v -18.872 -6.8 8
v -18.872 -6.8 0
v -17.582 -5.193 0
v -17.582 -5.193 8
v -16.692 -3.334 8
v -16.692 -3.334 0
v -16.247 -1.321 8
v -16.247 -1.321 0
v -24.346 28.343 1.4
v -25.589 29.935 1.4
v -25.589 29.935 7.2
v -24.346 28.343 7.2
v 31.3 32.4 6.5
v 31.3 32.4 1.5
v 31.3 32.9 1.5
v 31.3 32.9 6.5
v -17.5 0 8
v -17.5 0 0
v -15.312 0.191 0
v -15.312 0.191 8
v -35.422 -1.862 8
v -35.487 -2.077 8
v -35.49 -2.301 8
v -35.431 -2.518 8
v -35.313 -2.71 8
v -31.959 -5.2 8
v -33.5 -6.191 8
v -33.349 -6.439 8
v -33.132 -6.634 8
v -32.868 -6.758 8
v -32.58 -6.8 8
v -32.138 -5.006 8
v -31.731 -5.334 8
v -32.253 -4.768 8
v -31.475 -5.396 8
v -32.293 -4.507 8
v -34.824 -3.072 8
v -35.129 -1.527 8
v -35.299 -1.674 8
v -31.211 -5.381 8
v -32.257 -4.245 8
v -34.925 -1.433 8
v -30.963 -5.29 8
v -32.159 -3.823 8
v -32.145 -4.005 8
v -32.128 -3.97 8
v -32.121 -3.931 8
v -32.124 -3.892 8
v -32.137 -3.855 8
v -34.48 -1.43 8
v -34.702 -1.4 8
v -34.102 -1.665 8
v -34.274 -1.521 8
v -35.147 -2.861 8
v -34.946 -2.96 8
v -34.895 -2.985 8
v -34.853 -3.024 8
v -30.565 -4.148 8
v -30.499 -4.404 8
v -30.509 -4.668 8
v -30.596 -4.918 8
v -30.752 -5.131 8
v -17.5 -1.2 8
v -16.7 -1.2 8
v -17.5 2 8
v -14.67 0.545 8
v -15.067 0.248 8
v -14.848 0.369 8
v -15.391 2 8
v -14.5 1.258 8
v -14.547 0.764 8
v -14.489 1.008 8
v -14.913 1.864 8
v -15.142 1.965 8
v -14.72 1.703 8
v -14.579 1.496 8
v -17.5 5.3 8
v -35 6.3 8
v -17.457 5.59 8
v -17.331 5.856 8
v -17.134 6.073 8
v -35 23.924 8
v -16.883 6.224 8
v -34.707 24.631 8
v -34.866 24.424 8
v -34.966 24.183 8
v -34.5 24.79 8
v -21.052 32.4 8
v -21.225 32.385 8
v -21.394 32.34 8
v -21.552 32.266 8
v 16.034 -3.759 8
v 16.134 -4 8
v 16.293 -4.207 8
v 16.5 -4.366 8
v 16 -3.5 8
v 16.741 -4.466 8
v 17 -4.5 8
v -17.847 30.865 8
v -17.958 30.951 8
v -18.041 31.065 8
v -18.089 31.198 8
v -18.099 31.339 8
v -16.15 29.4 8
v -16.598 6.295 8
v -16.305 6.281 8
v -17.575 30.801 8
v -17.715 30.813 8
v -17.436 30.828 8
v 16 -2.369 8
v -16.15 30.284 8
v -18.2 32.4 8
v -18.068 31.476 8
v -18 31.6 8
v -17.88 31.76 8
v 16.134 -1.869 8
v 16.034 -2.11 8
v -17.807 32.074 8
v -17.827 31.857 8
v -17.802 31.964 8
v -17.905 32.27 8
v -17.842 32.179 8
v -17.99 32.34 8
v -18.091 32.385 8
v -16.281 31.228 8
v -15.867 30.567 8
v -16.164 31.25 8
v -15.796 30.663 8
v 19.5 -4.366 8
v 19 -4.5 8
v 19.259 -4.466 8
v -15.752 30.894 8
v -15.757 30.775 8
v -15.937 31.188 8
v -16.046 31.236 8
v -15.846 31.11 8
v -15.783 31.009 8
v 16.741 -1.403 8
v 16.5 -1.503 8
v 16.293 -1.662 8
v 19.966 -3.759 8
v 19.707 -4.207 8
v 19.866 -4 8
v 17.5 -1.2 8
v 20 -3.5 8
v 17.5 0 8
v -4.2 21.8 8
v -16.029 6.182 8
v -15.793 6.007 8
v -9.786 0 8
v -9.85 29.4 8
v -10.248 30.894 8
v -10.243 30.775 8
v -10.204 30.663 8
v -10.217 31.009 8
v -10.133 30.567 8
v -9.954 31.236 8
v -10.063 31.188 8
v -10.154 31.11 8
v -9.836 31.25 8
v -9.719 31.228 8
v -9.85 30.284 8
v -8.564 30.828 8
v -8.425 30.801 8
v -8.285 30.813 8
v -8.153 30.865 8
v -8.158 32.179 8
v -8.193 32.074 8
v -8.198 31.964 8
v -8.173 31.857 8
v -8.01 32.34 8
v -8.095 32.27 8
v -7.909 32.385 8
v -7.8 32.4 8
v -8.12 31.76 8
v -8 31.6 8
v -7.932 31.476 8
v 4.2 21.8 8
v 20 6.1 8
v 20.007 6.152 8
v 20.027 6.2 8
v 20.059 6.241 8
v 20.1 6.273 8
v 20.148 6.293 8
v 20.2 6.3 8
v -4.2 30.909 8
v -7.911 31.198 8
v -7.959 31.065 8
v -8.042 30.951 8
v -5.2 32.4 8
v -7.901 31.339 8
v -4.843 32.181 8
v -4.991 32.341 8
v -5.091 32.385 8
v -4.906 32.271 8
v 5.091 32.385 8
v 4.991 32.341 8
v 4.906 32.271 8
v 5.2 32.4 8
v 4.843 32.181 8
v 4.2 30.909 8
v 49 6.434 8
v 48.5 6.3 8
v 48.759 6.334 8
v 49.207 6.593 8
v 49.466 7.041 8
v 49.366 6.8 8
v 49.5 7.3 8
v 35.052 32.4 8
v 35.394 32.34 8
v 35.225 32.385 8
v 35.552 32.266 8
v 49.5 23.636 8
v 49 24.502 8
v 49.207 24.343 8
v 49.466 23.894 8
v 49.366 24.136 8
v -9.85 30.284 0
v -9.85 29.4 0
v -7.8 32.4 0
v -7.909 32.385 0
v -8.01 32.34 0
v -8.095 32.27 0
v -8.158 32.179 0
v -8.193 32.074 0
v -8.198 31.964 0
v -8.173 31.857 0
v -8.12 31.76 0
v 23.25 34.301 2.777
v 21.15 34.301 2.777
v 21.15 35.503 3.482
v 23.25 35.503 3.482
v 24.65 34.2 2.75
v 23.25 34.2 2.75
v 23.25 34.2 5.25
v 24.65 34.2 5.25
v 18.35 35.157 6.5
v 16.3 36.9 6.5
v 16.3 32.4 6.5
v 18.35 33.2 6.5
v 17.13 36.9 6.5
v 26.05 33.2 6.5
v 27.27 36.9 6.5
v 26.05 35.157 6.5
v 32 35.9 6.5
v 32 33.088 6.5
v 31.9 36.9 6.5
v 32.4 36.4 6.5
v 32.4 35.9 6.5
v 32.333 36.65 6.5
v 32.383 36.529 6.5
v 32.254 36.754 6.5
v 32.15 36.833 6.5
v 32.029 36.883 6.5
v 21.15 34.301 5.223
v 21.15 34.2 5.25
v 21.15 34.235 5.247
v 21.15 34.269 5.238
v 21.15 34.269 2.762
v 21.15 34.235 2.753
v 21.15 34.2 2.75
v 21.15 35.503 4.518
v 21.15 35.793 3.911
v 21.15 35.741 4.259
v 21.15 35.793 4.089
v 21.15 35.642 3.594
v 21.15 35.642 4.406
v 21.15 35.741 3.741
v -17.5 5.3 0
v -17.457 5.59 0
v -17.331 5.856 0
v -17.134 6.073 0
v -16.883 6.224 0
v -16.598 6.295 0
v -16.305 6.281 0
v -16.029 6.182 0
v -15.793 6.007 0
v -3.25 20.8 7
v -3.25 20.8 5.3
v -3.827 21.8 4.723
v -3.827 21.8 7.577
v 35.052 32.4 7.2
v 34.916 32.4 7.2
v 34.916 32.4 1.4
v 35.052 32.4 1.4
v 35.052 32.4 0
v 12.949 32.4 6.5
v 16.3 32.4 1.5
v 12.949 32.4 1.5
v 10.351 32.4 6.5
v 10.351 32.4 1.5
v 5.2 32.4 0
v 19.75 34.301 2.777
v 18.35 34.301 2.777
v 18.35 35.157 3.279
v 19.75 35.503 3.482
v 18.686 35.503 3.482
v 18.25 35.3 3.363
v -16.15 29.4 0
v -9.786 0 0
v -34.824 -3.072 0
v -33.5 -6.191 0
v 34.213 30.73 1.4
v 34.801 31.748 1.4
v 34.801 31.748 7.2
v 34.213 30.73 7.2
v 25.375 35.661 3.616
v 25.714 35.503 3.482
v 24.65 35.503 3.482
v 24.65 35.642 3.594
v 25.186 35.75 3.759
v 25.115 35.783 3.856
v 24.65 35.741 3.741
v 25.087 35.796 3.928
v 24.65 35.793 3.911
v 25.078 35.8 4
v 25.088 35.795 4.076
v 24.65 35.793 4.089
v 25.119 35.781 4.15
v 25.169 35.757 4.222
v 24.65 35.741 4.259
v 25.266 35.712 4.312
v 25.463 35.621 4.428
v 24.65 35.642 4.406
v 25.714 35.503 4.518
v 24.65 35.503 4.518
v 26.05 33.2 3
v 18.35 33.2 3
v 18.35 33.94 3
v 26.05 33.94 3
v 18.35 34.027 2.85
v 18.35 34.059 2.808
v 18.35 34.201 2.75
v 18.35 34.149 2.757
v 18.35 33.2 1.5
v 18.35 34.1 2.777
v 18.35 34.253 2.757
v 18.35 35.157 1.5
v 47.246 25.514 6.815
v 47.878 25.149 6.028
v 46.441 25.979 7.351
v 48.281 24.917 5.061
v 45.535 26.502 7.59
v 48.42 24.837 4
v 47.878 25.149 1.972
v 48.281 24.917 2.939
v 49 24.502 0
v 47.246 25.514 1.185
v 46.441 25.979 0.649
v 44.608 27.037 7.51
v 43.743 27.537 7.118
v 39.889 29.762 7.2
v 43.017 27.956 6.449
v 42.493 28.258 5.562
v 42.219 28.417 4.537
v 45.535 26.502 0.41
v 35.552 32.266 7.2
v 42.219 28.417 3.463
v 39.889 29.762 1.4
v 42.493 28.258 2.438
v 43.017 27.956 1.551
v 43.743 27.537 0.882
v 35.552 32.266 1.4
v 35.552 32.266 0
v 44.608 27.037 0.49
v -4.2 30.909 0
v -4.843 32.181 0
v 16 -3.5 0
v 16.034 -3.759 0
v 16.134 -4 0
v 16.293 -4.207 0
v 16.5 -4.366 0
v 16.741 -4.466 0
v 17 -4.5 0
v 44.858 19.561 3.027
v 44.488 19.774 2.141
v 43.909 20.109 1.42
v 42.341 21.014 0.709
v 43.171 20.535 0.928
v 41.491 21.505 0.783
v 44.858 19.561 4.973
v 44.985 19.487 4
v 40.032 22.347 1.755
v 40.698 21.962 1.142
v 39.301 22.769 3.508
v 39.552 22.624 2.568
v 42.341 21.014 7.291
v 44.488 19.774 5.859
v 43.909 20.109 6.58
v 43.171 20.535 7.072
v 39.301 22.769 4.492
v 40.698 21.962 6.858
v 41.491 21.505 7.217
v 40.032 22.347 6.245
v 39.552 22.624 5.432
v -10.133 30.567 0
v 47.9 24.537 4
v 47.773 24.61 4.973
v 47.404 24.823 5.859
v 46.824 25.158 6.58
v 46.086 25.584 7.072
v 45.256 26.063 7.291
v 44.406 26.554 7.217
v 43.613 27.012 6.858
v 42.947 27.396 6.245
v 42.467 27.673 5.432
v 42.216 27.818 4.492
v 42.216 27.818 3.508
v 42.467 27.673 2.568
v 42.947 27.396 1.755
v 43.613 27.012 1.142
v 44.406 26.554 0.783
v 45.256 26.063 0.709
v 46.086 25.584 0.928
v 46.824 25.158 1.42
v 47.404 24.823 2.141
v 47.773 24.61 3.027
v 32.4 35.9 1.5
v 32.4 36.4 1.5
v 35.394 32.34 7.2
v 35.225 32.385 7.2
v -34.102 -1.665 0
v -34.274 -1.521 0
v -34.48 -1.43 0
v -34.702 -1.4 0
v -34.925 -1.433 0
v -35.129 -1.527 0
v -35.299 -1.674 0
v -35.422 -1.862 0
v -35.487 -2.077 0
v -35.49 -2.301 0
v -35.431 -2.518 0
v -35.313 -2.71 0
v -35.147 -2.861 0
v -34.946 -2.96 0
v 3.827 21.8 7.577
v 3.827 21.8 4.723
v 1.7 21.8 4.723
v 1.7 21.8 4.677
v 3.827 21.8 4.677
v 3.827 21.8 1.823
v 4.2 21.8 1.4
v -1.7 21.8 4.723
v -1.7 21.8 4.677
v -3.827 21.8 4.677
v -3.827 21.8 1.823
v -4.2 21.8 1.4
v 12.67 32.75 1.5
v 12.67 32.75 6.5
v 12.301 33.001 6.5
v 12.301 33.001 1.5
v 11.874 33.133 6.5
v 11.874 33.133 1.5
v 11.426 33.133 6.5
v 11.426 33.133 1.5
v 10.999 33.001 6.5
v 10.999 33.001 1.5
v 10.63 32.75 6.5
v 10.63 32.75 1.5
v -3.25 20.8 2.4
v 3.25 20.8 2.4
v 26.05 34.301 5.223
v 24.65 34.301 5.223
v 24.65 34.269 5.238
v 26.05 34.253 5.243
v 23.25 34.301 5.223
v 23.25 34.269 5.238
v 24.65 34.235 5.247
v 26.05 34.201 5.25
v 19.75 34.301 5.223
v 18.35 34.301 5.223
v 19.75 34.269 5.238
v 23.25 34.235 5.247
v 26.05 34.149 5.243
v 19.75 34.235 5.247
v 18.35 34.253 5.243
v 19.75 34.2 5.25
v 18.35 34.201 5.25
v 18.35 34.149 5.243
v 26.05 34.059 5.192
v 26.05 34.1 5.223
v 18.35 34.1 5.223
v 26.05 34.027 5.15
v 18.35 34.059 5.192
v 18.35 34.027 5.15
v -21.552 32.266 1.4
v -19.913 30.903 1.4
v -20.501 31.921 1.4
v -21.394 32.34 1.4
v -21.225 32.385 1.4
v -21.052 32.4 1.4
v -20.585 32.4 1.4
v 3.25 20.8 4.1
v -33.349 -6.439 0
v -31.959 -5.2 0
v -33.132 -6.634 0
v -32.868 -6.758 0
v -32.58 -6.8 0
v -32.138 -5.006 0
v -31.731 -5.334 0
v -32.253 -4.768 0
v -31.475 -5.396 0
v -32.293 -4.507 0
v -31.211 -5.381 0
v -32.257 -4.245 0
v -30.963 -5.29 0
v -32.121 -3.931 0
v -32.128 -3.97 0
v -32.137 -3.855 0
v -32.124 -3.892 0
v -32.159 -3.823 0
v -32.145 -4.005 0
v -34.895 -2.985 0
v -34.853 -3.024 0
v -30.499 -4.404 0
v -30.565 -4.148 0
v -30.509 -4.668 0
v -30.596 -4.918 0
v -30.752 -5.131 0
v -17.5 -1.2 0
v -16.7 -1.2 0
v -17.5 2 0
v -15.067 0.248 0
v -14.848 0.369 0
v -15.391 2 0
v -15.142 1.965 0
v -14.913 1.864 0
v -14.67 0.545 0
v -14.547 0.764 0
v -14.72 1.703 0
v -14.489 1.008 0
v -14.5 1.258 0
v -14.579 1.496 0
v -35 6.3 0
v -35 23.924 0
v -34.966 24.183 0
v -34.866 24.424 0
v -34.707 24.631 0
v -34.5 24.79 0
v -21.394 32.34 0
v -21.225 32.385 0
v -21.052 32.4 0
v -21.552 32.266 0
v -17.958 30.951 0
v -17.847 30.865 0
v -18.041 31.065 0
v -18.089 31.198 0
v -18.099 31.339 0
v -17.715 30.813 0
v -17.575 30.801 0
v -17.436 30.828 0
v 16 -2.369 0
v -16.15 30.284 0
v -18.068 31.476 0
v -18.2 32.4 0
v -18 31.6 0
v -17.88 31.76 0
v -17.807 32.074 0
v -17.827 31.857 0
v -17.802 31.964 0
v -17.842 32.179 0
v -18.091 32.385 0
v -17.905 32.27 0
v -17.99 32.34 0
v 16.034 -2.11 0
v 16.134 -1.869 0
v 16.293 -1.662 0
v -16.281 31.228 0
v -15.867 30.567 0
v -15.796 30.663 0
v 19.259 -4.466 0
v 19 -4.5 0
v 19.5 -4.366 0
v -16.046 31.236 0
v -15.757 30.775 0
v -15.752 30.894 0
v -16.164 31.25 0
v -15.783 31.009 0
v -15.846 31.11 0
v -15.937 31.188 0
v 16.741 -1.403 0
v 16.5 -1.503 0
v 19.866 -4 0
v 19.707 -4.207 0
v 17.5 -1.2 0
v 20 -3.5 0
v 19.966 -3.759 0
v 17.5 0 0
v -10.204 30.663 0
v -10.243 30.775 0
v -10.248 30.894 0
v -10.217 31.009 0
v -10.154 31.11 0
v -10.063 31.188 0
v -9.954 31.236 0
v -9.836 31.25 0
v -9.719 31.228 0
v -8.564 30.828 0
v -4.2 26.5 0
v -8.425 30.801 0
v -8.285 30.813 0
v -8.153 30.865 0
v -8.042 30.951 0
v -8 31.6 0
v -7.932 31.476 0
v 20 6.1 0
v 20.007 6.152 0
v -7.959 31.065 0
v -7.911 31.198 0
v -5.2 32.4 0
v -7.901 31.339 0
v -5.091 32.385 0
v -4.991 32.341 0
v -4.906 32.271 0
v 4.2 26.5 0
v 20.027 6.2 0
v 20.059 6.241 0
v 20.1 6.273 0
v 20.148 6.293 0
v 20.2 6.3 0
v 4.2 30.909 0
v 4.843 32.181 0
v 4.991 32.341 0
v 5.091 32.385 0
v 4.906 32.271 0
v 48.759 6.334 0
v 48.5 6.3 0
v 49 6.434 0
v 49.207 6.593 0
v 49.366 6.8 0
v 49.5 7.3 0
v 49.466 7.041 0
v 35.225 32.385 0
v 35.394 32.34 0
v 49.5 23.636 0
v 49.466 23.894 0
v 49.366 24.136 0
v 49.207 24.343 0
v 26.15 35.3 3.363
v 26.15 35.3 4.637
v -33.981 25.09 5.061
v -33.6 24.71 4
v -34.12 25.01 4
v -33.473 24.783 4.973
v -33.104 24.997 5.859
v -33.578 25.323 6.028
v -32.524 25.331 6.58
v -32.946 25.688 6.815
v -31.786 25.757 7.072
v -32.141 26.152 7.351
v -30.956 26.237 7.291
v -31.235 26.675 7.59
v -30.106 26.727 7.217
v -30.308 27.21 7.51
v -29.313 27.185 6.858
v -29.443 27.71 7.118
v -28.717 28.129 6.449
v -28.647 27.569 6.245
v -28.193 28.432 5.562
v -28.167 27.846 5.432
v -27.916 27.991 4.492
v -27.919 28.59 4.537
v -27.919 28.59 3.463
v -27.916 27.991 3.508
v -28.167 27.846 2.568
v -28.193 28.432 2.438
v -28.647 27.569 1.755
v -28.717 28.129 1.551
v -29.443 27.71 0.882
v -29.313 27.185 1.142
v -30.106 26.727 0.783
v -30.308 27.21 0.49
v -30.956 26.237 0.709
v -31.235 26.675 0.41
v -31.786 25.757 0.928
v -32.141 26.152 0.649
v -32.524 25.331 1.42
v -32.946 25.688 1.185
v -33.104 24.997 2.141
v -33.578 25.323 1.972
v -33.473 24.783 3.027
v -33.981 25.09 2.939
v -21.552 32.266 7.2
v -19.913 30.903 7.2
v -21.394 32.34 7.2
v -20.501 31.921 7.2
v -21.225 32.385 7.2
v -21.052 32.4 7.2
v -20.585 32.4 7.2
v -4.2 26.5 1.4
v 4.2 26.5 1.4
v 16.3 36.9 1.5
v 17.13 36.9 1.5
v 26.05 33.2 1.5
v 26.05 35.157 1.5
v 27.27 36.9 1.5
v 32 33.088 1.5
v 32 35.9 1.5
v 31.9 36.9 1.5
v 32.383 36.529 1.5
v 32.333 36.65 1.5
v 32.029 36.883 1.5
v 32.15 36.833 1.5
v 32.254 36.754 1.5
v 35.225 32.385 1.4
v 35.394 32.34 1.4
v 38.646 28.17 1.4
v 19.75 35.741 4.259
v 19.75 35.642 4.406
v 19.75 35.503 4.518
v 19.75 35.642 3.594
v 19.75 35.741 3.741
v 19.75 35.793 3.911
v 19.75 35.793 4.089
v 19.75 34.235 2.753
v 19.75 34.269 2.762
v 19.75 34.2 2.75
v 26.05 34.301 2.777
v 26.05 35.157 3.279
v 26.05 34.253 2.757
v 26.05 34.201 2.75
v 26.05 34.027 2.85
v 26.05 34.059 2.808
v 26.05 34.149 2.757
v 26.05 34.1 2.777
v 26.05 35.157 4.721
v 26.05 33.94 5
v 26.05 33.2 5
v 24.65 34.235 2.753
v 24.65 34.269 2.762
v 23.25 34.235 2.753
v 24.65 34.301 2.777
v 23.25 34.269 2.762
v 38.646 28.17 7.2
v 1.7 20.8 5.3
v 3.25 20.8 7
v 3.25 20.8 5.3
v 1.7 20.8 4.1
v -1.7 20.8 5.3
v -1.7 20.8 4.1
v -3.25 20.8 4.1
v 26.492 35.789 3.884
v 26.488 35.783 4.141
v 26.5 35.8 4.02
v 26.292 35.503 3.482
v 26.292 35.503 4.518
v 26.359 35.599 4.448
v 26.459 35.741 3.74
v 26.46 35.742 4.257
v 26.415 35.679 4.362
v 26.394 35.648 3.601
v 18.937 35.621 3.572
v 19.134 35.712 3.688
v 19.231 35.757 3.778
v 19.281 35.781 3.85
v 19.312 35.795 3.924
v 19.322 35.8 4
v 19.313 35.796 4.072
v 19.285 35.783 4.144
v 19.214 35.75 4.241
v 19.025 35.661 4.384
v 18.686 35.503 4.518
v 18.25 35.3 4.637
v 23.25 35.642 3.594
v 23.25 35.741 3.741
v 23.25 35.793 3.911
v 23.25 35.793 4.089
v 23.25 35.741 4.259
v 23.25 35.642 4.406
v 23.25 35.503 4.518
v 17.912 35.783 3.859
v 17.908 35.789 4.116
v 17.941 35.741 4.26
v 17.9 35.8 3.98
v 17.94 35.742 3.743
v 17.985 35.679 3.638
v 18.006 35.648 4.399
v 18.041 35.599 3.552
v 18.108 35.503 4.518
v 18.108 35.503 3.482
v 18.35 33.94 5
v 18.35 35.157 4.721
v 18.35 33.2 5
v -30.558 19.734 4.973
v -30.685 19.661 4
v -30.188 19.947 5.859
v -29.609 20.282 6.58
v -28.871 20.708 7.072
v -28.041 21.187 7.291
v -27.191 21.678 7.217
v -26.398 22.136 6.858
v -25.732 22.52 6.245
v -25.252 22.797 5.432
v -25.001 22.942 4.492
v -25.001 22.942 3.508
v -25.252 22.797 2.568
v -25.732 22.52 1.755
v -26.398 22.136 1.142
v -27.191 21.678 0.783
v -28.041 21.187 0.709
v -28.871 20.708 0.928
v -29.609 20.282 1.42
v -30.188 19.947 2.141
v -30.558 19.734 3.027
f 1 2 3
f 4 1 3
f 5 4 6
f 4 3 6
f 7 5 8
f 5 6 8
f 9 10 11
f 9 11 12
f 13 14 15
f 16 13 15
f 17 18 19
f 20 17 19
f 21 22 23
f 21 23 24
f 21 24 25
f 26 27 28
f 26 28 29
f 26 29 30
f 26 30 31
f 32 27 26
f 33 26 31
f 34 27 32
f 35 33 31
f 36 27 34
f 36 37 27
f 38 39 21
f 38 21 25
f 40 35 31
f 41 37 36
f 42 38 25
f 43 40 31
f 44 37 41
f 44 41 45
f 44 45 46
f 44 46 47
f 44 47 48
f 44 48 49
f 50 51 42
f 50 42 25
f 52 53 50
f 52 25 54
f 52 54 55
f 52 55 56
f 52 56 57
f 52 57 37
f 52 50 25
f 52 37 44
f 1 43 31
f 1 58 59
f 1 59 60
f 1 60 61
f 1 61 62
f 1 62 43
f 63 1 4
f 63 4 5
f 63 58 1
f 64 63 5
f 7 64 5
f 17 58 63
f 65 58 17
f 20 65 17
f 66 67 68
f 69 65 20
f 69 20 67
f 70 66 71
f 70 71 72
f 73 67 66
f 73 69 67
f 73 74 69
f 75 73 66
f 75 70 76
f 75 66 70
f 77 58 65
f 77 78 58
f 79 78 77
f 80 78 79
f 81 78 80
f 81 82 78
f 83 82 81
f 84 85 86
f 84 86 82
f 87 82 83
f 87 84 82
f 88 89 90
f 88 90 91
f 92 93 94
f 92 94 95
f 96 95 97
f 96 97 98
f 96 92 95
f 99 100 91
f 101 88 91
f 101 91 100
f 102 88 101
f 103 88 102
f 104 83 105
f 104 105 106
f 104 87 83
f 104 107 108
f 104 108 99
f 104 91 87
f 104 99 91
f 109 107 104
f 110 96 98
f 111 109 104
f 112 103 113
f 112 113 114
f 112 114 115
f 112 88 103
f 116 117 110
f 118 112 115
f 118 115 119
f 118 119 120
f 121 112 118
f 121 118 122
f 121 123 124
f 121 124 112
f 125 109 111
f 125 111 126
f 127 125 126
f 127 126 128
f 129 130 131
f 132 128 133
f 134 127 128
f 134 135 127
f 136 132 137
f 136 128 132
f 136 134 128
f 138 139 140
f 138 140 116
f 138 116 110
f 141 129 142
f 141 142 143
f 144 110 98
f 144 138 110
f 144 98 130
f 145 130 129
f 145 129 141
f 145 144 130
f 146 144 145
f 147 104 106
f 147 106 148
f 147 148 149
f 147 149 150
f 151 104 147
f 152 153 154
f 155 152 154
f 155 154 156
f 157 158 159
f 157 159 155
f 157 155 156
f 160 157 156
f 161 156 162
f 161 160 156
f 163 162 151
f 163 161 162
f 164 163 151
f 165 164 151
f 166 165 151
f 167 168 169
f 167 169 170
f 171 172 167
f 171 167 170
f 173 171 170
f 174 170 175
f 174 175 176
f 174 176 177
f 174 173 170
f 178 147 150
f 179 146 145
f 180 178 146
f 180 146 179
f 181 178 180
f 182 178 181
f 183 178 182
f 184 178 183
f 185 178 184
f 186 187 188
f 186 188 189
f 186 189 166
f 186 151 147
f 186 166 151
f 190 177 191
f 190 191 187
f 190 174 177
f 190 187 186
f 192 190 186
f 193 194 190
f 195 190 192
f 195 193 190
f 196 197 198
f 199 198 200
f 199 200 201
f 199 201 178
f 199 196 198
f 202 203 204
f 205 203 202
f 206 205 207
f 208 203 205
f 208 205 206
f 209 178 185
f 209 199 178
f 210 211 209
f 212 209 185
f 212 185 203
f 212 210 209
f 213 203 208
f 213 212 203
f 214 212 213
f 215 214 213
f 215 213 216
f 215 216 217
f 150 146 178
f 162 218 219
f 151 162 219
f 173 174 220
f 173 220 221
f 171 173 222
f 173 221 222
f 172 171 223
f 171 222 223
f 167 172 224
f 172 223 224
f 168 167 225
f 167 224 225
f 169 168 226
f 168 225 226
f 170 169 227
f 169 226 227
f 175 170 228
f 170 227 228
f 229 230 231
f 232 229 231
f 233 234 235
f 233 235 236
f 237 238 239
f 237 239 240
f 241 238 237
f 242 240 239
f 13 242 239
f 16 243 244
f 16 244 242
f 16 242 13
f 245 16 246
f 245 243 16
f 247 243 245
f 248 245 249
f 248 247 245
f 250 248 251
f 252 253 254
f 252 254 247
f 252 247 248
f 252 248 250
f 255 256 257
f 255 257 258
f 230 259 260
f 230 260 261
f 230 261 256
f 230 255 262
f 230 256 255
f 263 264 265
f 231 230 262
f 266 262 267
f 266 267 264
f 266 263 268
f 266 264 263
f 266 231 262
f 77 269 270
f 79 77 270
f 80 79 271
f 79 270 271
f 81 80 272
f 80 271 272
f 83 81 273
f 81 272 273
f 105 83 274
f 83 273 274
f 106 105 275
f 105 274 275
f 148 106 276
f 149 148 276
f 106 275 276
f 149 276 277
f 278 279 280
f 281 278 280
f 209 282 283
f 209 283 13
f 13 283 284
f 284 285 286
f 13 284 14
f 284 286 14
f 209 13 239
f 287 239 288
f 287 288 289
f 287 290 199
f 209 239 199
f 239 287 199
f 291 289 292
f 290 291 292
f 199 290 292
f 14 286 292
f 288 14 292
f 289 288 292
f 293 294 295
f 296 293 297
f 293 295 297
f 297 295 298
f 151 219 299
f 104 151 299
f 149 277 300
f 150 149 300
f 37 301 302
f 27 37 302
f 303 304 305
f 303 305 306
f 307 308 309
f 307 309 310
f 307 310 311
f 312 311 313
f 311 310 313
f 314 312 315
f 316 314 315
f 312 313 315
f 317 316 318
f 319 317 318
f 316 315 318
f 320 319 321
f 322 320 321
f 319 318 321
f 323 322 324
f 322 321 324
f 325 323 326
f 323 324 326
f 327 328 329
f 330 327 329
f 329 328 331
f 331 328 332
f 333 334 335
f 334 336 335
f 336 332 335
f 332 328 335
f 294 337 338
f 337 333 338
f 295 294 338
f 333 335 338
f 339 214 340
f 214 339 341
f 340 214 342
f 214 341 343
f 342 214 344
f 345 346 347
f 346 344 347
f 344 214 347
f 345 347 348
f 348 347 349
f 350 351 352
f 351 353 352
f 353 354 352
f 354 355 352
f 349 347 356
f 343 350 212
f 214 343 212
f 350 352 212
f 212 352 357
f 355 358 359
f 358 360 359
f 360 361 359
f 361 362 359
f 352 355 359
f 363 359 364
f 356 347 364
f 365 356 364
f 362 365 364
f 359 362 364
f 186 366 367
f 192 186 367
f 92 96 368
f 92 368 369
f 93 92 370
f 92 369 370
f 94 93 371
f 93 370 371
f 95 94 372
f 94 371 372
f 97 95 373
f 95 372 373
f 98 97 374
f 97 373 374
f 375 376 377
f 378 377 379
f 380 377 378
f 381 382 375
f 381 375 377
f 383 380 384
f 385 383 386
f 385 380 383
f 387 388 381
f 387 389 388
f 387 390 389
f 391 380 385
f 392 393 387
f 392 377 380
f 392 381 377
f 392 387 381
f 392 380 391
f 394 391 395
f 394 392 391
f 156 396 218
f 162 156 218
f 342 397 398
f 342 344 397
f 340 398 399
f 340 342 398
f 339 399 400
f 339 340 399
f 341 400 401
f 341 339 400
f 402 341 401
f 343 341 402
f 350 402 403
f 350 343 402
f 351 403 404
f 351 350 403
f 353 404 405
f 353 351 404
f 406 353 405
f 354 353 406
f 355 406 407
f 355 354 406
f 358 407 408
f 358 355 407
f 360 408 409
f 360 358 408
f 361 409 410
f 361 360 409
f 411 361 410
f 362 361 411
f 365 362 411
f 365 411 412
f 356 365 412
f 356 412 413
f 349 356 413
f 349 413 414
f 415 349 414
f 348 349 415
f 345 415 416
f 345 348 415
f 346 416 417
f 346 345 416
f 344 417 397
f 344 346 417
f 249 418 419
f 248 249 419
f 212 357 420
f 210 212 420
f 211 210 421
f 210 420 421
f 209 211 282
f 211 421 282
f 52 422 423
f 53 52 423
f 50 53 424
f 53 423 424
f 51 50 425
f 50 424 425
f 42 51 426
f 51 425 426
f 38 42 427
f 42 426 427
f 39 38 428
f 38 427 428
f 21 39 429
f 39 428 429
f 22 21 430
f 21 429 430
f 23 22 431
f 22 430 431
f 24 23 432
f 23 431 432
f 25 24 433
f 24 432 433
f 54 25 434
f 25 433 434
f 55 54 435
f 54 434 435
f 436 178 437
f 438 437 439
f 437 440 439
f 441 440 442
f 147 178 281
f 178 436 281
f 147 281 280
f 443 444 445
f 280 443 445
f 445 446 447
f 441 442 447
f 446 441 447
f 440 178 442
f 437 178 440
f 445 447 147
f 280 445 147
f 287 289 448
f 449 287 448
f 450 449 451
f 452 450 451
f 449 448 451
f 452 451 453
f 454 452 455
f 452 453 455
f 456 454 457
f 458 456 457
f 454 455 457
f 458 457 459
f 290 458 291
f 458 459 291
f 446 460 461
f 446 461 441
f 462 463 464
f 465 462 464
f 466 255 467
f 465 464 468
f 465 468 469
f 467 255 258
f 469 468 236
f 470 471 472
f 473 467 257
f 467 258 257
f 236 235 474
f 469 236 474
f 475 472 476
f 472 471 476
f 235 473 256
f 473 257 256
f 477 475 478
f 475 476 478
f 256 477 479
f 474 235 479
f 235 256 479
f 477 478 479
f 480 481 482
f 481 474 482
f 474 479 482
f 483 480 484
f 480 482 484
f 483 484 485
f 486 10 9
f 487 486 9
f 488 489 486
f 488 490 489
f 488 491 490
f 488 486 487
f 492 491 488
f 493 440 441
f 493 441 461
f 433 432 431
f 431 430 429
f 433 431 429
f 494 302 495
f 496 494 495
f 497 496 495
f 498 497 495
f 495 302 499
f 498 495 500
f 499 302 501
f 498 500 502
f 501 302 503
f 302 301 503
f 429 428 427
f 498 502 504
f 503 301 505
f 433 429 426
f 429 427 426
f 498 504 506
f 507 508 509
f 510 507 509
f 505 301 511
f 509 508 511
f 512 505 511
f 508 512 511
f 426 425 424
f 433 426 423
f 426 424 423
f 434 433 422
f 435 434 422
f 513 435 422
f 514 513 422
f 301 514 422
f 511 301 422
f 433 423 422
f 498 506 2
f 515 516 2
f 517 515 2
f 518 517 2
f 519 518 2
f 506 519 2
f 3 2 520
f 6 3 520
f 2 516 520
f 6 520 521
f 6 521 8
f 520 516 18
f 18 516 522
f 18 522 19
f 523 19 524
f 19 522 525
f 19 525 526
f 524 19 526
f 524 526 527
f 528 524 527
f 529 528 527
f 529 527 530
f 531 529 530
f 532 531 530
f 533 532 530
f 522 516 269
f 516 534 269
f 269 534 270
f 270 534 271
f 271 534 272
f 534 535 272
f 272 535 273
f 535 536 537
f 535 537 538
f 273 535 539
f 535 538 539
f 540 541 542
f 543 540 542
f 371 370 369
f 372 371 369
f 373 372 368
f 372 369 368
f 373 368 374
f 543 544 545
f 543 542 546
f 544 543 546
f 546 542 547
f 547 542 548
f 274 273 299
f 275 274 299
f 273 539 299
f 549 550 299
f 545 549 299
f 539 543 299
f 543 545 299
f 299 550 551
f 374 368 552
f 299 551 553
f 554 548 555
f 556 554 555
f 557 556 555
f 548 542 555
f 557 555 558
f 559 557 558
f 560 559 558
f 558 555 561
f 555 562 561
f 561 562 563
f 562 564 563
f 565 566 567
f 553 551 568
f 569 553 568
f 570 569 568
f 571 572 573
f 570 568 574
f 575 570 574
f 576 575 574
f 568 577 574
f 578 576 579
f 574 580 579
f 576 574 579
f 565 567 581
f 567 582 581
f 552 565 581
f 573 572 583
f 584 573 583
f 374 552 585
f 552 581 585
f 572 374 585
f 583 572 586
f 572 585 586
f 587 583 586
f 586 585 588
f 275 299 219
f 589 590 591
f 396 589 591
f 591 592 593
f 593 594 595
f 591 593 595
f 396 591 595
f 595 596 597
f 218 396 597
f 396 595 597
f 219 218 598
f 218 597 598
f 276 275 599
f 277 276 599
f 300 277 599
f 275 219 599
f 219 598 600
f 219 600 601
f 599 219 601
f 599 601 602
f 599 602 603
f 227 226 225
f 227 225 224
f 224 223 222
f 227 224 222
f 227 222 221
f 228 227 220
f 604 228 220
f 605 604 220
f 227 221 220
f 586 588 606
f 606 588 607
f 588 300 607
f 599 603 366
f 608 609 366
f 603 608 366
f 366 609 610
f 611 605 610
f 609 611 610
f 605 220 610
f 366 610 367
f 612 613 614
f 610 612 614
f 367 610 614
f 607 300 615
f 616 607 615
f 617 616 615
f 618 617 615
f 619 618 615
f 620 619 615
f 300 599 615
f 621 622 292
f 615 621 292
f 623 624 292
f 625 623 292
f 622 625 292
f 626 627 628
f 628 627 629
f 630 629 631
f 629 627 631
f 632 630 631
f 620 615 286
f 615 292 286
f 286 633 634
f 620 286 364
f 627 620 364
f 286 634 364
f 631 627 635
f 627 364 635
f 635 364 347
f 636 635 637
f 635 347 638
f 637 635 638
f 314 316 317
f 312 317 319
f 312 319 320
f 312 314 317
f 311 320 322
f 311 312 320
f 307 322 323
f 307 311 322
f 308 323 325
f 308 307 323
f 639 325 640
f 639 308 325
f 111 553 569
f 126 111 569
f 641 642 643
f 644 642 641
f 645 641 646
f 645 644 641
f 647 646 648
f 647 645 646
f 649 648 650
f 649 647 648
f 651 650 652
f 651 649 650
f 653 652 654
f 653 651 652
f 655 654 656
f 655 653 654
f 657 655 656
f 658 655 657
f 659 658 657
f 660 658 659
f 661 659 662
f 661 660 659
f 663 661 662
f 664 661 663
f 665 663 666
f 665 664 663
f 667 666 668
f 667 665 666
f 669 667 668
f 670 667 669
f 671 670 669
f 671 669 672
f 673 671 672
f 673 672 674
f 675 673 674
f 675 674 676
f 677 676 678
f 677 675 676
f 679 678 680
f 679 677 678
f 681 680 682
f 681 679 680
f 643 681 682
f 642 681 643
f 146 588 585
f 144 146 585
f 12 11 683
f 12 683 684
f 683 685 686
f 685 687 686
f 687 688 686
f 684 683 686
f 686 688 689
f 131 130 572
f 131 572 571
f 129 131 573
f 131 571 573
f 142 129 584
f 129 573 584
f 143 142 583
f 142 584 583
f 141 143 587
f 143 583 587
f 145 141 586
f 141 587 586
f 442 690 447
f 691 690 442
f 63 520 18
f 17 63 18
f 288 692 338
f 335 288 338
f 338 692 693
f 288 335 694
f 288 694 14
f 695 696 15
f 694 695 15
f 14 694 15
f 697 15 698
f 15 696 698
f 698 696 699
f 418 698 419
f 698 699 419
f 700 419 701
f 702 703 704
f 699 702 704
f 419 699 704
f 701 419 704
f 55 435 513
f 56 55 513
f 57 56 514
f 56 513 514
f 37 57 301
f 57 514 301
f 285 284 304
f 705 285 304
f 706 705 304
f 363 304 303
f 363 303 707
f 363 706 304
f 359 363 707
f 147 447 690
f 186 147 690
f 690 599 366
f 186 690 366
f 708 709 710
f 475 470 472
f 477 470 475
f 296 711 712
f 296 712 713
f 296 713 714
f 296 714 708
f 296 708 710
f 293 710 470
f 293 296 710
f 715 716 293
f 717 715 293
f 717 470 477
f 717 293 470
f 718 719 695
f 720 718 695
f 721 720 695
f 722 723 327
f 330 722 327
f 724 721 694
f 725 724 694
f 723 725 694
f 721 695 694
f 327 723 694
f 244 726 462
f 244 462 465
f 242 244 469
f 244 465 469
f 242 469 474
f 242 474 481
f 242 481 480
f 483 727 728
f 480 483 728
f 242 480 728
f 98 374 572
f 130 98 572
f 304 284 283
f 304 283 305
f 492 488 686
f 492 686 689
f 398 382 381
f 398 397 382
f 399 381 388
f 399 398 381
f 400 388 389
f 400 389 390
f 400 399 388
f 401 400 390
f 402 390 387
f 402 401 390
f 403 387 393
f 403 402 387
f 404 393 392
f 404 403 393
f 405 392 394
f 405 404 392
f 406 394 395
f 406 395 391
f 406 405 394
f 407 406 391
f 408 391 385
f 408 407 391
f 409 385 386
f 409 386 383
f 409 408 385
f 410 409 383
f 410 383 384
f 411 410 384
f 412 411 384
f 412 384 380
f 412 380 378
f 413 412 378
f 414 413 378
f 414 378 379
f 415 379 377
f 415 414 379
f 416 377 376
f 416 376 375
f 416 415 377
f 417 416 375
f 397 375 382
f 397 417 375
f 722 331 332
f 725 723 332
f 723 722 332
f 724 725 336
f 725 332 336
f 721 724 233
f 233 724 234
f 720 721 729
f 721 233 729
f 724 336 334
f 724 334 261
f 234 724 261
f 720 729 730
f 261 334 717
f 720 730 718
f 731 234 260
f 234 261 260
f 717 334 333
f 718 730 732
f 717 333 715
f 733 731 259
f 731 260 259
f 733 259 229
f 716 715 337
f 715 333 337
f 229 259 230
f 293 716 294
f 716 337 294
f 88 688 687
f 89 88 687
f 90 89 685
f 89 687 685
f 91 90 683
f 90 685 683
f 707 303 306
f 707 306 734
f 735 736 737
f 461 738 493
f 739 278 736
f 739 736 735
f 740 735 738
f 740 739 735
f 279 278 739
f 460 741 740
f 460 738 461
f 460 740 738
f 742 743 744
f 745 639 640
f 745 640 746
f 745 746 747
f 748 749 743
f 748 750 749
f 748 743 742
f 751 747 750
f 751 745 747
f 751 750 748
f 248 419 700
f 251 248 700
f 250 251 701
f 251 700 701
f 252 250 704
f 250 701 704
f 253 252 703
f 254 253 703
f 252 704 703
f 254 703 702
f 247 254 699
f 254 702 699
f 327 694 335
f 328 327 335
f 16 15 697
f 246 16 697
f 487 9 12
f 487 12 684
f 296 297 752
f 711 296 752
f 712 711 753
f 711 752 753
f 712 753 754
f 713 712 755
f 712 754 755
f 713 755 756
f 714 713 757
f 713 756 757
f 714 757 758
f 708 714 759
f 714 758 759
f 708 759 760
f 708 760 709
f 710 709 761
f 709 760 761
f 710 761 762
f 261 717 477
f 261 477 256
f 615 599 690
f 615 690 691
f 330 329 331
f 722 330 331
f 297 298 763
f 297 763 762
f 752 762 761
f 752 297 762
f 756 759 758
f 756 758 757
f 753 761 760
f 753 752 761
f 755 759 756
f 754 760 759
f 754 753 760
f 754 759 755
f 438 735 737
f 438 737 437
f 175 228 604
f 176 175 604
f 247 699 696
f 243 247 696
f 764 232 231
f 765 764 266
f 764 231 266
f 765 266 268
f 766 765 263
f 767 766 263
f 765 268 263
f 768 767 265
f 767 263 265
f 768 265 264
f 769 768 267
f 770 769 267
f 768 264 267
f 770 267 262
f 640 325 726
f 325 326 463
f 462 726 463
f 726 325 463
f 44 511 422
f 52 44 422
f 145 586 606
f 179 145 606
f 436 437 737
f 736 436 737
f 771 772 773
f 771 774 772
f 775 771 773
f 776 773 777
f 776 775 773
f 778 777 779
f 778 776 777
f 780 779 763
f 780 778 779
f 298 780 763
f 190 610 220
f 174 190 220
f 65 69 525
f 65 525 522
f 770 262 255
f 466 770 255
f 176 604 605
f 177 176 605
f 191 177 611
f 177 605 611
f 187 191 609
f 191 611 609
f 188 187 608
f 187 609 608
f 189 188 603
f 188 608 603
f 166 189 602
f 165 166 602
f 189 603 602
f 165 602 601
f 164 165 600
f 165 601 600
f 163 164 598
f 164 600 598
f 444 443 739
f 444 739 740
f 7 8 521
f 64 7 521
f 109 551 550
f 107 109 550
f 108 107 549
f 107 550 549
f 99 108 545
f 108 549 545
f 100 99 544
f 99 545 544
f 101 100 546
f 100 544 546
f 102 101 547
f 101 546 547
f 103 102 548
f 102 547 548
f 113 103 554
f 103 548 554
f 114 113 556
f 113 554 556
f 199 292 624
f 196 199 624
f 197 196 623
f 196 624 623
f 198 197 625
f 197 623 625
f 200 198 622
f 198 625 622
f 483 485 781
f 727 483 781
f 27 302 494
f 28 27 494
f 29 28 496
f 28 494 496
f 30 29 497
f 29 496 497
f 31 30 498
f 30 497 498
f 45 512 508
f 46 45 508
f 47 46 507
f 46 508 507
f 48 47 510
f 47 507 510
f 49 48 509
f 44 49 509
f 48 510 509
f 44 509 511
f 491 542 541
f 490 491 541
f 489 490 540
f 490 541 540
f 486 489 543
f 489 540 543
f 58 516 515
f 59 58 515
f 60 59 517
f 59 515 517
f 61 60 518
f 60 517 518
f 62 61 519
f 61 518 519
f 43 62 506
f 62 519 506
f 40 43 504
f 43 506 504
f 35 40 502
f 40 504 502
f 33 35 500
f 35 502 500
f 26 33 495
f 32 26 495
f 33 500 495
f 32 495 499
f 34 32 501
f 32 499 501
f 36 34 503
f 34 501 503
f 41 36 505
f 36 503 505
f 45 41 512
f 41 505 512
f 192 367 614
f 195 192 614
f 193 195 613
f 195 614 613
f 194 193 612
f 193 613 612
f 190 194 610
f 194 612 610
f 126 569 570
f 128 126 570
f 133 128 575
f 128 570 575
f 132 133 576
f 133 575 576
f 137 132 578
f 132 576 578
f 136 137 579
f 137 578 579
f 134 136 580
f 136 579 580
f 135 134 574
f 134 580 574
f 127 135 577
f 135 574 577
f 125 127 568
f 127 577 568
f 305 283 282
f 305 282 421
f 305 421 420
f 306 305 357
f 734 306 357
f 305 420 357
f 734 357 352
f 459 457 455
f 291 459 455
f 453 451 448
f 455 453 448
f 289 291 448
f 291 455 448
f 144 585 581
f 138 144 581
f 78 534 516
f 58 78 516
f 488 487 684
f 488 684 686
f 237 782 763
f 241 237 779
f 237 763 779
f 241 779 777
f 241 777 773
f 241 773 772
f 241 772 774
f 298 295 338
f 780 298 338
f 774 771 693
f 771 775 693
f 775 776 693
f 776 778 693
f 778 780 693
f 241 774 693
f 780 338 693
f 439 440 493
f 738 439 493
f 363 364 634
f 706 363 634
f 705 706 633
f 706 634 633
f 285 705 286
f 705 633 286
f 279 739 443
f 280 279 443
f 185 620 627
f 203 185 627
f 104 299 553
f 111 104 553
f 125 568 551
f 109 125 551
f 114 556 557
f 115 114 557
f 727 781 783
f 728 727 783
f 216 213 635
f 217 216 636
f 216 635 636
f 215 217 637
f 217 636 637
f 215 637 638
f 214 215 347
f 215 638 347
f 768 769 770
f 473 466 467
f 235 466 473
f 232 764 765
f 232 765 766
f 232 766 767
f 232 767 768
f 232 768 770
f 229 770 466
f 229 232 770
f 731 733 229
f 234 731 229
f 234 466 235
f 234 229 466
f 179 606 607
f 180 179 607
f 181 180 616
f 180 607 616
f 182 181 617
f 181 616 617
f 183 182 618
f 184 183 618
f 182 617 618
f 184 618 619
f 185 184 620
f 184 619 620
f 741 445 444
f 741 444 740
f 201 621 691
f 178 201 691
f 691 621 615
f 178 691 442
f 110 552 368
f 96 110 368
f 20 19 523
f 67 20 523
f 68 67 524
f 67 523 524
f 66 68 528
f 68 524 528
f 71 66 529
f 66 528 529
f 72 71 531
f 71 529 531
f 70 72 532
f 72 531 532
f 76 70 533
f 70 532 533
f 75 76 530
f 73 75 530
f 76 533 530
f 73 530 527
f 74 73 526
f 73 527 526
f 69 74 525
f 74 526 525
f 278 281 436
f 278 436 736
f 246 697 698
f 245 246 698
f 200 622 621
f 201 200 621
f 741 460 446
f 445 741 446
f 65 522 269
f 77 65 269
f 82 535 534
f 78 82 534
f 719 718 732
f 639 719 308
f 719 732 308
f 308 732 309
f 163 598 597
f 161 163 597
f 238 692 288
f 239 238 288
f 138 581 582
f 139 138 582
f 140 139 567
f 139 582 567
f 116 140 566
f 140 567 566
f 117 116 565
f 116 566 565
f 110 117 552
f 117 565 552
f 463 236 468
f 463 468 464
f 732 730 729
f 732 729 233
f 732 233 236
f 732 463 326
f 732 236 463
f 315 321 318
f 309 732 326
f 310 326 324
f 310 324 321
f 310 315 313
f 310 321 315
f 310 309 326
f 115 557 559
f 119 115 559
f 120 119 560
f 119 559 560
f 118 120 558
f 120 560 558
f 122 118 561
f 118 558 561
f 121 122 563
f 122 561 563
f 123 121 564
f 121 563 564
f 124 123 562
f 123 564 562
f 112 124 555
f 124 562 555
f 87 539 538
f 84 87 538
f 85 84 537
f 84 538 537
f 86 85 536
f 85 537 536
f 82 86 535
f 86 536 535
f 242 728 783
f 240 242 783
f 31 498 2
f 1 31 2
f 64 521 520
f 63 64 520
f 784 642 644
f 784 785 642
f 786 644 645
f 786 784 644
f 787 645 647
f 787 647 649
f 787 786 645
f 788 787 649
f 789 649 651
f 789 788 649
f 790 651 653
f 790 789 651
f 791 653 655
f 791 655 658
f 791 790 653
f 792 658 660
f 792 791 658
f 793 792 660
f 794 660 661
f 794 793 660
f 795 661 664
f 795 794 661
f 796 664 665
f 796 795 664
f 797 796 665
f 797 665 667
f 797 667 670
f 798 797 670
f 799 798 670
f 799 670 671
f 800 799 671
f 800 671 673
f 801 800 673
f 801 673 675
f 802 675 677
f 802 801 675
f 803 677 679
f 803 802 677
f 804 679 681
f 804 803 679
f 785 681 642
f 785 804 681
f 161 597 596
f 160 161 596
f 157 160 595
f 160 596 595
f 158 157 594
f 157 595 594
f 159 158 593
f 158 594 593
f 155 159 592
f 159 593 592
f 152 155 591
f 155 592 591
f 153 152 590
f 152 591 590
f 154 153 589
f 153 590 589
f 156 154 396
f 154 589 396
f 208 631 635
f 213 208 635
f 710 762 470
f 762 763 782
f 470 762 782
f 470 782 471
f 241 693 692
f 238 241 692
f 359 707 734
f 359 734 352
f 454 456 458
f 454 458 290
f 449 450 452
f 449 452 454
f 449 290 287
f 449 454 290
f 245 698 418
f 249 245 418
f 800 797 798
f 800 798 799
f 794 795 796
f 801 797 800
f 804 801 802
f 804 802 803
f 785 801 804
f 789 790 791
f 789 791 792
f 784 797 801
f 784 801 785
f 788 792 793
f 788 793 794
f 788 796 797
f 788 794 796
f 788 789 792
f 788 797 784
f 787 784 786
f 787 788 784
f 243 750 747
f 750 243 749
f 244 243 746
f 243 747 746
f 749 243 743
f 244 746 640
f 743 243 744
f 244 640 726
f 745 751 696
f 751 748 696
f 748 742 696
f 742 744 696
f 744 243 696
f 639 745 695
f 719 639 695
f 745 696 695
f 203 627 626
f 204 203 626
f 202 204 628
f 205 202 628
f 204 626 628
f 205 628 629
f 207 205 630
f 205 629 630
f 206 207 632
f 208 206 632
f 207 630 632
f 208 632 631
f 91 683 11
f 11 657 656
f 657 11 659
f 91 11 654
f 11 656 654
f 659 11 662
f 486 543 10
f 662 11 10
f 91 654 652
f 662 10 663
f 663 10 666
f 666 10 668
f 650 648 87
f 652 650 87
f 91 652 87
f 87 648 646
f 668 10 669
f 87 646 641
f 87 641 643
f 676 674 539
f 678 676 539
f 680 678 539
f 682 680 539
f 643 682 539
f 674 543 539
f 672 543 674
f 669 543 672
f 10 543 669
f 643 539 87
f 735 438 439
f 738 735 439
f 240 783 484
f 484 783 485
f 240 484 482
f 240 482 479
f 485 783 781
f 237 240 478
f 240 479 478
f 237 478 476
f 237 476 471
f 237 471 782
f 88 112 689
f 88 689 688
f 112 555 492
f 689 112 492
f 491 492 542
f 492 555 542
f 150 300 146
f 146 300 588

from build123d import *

# Parameters (mm, degrees)
EXTRUDE1_DEPTH       = 8
SKETCH2_W            = 8.4
SKETCH2_H            = 4.7
EXTRUDE2_DEPTH       = 1.4
EXTRUDE3_DEPTH       = 4.2
EXTRUDE3_DEPTH_BACK  = 4.2
EXTRUDE4_DEPTH       = 4.2
EXTRUDE4_DEPTH_BACK  = 4.2
EXTRUDE5_DEPTH       = 1.7
EXTRUDE5_DEPTH_BACK  = 1.7
SKETCH5_W            = 2
SKETCH5_H            = 1
EXTRUDE6_DEPTH       = 8
EXTRUDE7_DEPTH       = 8
EXTRUDE8_DEPTH       = 5.8
EXTRUDE9_DEPTH       = 5.8
EXTRUDE10_DEPTH      = 2.5
EXTRUDE10_DEPTH_BACK = 2.5
EXTRUDE11_DEPTH      = 5
EXTRUDE11_DEPTH_BACK = 5
EXTRUDE12_DEPTH      = 1.5
EXTRUDE12_DEPTH_BACK = 1.5


with BuildPart() as part:
    # Sketch1 → Extrude1 (new body)
    with BuildSketch(Plane.XY):
        with BuildLine():
            Line((-34.824054735, -3.072067398), (-33.500260521, -6.190731128))
            ThreePointArc((-33.500260521, -6.190731128), (-33.131692653, -6.633885822), (-32.579755667, -6.8))
            Line((-32.579755667, -6.8), (-18.872283192, -6.8))
            ThreePointArc((-18.872283192, -6.8), (-17.083537757, -4.288835387), (-16.247280004, -1.321305957))
            Line((-16.247280004, -1.321305957), (-16.7, -1.2))
            Line((-16.7, -1.2), (-17.5, -1.2))
            Line((-17.5, -1.2), (-17.5, 0))
            Line((-17.5, 0), (-15.311743878, 0.191447604))
            ThreePointArc((-15.311743878, 0.191447604), (-14.485569293, 1.133519165), (-15.390706981, 2))
            Line((-15.390706981, 2), (-17.5, 2))
            Line((-17.5, 2), (-17.5, 5.3))
            ThreePointArc((-17.5, 5.3), (-16.882683432, 6.223879533), (-15.792893219, 6.007106781))
            Line((-15.792893219, 6.007106781), (-9.785786438, 0))
            Line((-9.785786438, 0), (17.5, 0))
            Line((17.5, 0), (17.5, -1.2))
            Line((17.5, -1.2), (16.741180955, -1.40332495))
            ThreePointArc((16.741180955, -1.40332495), (16.20664666, -1.760489348), (16, -2.369250777))
            Line((16, -2.369250777), (16, -3.5))
            ThreePointArc((16, -3.5), (16.292893219, -4.207106781), (17, -4.5))
            Line((17, -4.5), (19, -4.5))
            ThreePointArc((19, -4.5), (19.707106781, -4.207106781), (20, -3.5))
            Line((20, -3.5), (20, 6.1))
            ThreePointArc((20, 6.1), (20.058578644, 6.241421356), (20.2, 6.3))
            Line((20.2, 6.3), (48.5, 6.3))
            ThreePointArc((48.5, 6.3), (49.207106781, 6.592893219), (49.5, 7.3))
            Line((49.5, 7.3), (49.5, 23.635680518))
            ThreePointArc((49.5, 23.635680518), (49.366025404, 24.135680518), (49, 24.501705922))
            Line((49, 24.501705922), (35.551804172, 32.266025404))
            ThreePointArc((35.551804172, 32.266025404), (35.310623217, 32.365925826), (35.051804172, 32.4))
            Line((35.051804172, 32.4), (5.2, 32.4))
            ThreePointArc((5.2, 32.4), (4.990511031, 32.340755589), (4.843077314, 32.180571859))
            Line((4.843077314, 32.180571859), (4.2, 30.909449746))
            Line((4.2, 30.909449746), (4.2, 21.8))
            Line((4.2, 21.8), (-4.2, 21.8))
            Line((-4.2, 21.8), (-4.2, 30.909449746))
            Line((-4.2, 30.909449746), (-4.843077314, 32.180571859))
            ThreePointArc((-4.843077314, 32.180571859), (-4.990511031, 32.340755589), (-5.2, 32.4))
            Line((-5.2, 32.4), (-7.8, 32.4))
            ThreePointArc((-7.8, 32.4), (-8.157770876, 32.178885438), (-8.12, 31.76))
            Line((-8.12, 31.76), (-8, 31.6))
            ThreePointArc((-8, 31.6), (-7.996119463, 31.005244998), (-8.563727578, 30.827566639))
            Line((-8.563727578, 30.827566639), (-9.719017938, 31.227946689))
            ThreePointArc((-9.719017938, 31.227946689), (-10.189007481, 31.062306212), (-10.132842712, 30.567157288))
            Line((-10.132842712, 30.567157288), (-9.85, 30.284314575))
            Line((-9.85, 30.284314575), (-9.85, 29.4))
            Line((-9.85, 29.4), (-13, 29.4))
            Line((-13, 29.4), (-16.15, 29.4))
            Line((-16.15, 29.4), (-16.15, 30.284314575))
            Line((-16.15, 30.284314575), (-15.867157288, 30.567157288))
            ThreePointArc((-15.867157288, 30.567157288), (-15.810992519, 31.062306212), (-16.280982062, 31.227946689))
            Line((-16.280982062, 31.227946689), (-17.436272422, 30.827566639))
            ThreePointArc((-17.436272422, 30.827566639), (-18.003880537, 31.005244998), (-18, 31.6))
            Line((-18, 31.6), (-17.88, 31.76))
            ThreePointArc((-17.88, 31.76), (-17.842229124, 32.178885438), (-18.2, 32.4))
            Line((-18.2, 32.4), (-21.051804172, 32.4))
            ThreePointArc((-21.051804172, 32.4), (-21.310623217, 32.365925826), (-21.551804172, 32.266025404))
            Line((-21.551804172, 32.266025404), (-34.5, 24.790381057))
            ThreePointArc((-34.5, 24.790381057), (-34.866025404, 24.424355653), (-35, 23.924355653))
            Line((-35, 23.924355653), (-35, 6.3))
            Line((-35, 6.3), (-30.564941956, -4.148341984))
            ThreePointArc((-30.564941956, -4.148341984), (-31.474501075, -5.396338117), (-32.145272576, -4.005346482))
            ThreePointArc((-32.145272576, -4.005346482), (-32.121013363, -3.911579893), (-32.15911356, -3.822534638))
            Line((-32.15911356, -3.822534638), (-34.102040633, -1.664695515))
            ThreePointArc((-34.102040633, -1.664695515), (-35.366900567, -1.76337794), (-34.945835863, -2.960170899))
            ThreePointArc((-34.945835863, -2.960170899), (-34.872837521, -3.002941804), (-34.824054735, -3.072067398))
        make_face()
    extrude(amount=EXTRUDE1_DEPTH)

    # Sketch2 → Extrude2 (add)
    with BuildSketch(Plane.XY):
        with Locations((0, 24.15)):
            Rectangle(SKETCH2_W, SKETCH2_H)
    extrude(amount=EXTRUDE2_DEPTH)

    # Sketch3 → Extrude3 (cut, two sides: drawn at the far end of the back side and taken through both)
    with BuildSketch(Plane(origin=(0, 0, 0), x_dir=(0, 0, -1), z_dir=(1, 0, 0)).offset(-EXTRUDE3_DEPTH_BACK)):
        Polygon((-7.577350269, 21.8), (-7, 20.8), (-5.3, 20.8), (-4.722649731, 21.8), align=None)
    extrude(amount=EXTRUDE3_DEPTH + EXTRUDE3_DEPTH_BACK, mode=Mode.SUBTRACT)

    # Sketch4 → Extrude4 (cut, two sides: drawn at the far end of the back side and taken through both)
    with BuildSketch(Plane(origin=(0, 0, 0), x_dir=(0, 0, -1), z_dir=(1, 0, 0)).offset(-EXTRUDE4_DEPTH_BACK)):
        Polygon((-4.677350269, 21.8), (-4.1, 20.8), (-2.4, 20.8), (-1.822649731, 21.8), align=None)
    extrude(amount=EXTRUDE4_DEPTH + EXTRUDE4_DEPTH_BACK, mode=Mode.SUBTRACT)

    # Sketch5 → Extrude5 (cut, two sides: drawn at the far end of the back side and taken through both)
    with BuildSketch(Plane(origin=(0, 0, 0), x_dir=(0, 0, -1), z_dir=(1, 0, 0)).offset(-EXTRUDE5_DEPTH_BACK)):
        with Locations((-4.7, 21.3)):
            Rectangle(SKETCH5_W, SKETCH5_H)
    extrude(amount=EXTRUDE5_DEPTH + EXTRUDE5_DEPTH_BACK, mode=Mode.SUBTRACT)

    # Sketch6 → Extrude6 (add)
    with BuildSketch(Plane.XY):
        Polygon((3.25, 20.8), (4.2, 20.8), (4.2, 21.8), (3.827350269, 21.8), align=None)
    extrude(amount=EXTRUDE6_DEPTH)

    # Sketch7 → Extrude7 (add)
    with BuildSketch(Plane.XY):
        Polygon((-4.2, 21.8), (-4.2, 20.8), (-3.25, 20.8), (-3.827350269, 21.8), align=None)
    extrude(amount=EXTRUDE7_DEPTH)

    # Sketch8 → Cut-Revolve1 (revolve, cut)
    with BuildSketch(Plane.XY.offset(4), mode=Mode.PRIVATE) as cut_revolve1_sk:
        Polygon((42.127146997, 21.137401035), (39.269263165, 22.787401035), (42.184455543, 27.836662349), (42.184455543, 28.436662349), (45.302146997, 26.636662349), align=None)
    revolve(cut_revolve1_sk.sketch.rotate(Axis((45.302146997, 26.636662349, 4), (-0.4999999999999722, -0.8660254037844548, 0)), 180), axis=Axis((45.302146997, 26.636662349, 4), (-0.4999999999999722, -0.8660254037844548, 0)), mode=Mode.SUBTRACT)

    # Sketch9 → Cut-Revolve2 (revolve, cut)
    with BuildSketch(Plane.XY.offset(4), mode=Mode.PRIVATE) as cut_revolve2_sk:
        Polygon((-31.002146997, 26.80986743), (-27.884455543, 28.60986743), (-27.884455543, 28.00986743), (-24.969263165, 22.960606116), (-27.827146997, 21.310606116), align=None)
    revolve(cut_revolve2_sk.sketch.rotate(Axis((-27.827146997, 21.310606116, 4), (-0.49999999999997385, 0.8660254037844538, 0)), 180), axis=Axis((-27.827146997, 21.310606116, 4), (-0.49999999999997385, 0.8660254037844538, 0)), mode=Mode.SUBTRACT)

    # Sketch10 → Extrude8 (cut)
    with BuildSketch(Plane.XY.offset(1.4)):
        Polygon((34.212951043, 30.729611541), (38.646064357, 28.170152376), (39.889488223, 29.761662349), (34.953143422, 32.611662349), (34.80082943, 31.747846776), align=None)
    extrude(amount=EXTRUDE8_DEPTH, mode=Mode.SUBTRACT)

    # Sketch11 → Extrude9 (cut)
    with BuildSketch(Plane.XY.offset(1.4)):
        Polygon((-25.589488223, 29.93486743), (-24.346064357, 28.343357457), (-19.912951043, 30.902816622), (-20.50082943, 31.921051857), (-20.653143422, 32.78486743), align=None)
    extrude(amount=EXTRUDE9_DEPTH, mode=Mode.SUBTRACT)

    # Sketch12 → Extrude10 (add, two sides: drawn at the far end of the back side and taken through both)
    with BuildSketch(Plane.XY.offset(4).offset(-EXTRUDE10_DEPTH_BACK)):
        with BuildLine():
            Line((10.15, 31.65), (31.3, 31.65))
            Line((31.3, 31.65), (31.3, 32.9))
            Line((31.3, 32.9), (32, 33.087564435))
            Line((32, 33.087564435), (32, 35.9))
            Line((32, 35.9), (32.4, 35.9))
            Line((32.4, 35.9), (32.4, 36.4))
            ThreePointArc((32.4, 36.4), (32.253553391, 36.753553391), (31.9, 36.9))
            Line((31.9, 36.9), (27.270332061, 36.9))
            Line((27.270332061, 36.9), (26.05, 35.157185199))
            Line((26.05, 35.157185199), (26.05, 33.2))
            Line((26.05, 33.2), (18.35, 33.2))
            Line((18.35, 33.2), (18.35, 35.157185199))
            Line((18.35, 35.157185199), (17.129667939, 36.9))
            Line((17.129667939, 36.9), (16.3, 36.9))
            Line((16.3, 36.9), (16.3, 32.4))
            Line((16.3, 32.4), (12.949038106, 32.4))
            ThreePointArc((12.949038106, 32.4), (11.261771432, 33.098888739), (10.15, 31.65))
        make_face()
    extrude(amount=EXTRUDE10_DEPTH + EXTRUDE10_DEPTH_BACK)

    # Sketch13 → Extrude11 (add, two sides: drawn at the far end of the back side and taken through both)
    with BuildSketch(Plane(origin=(22.2, 0, 0), x_dir=(0, 0, -1), z_dir=(1, 0, 0)).offset(-EXTRUDE11_DEPTH_BACK)):
        with BuildLine():
            Line((-5.15, 34.026794919), (-5, 33.940192379))
            Line((-5, 33.940192379), (-5, 33.2))
            Line((-5, 33.2), (-3, 33.2))
            Line((-3, 33.2), (-3, 33.940192379))
            Line((-3, 33.940192379), (-2.85, 34.026794919))
            ThreePointArc((-2.85, 34.026794919), (-2.756642553, 34.14888349), (-2.777468634, 34.301157934))
            Line((-2.777468634, 34.301157934), (-3.482405902, 35.503473803))
            ThreePointArc((-3.482405902, 35.503473803), (-4, 35.8), (-4.517594098, 35.503473803))
            Line((-4.517594098, 35.503473803), (-5.222531366, 34.301157934))
            ThreePointArc((-5.222531366, 34.301157934), (-5.243357447, 34.14888349), (-5.15, 34.026794919))
        make_face()
    extrude(amount=EXTRUDE11_DEPTH + EXTRUDE11_DEPTH_BACK)

    # Sketch14 → Extrude12 (cut, two sides: drawn at the far end of the back side and taken through both)
    with BuildSketch(Plane.XY.offset(4).offset(-EXTRUDE12_DEPTH_BACK)):
        Polygon((17.129667939, 36.9), (18.25, 35.3), (19.32225346, 35.8), (19.75, 35.8), (19.75, 34.2), (21.15, 34.2), (21.15, 35.8), (23.25, 35.8), (23.25, 34.2), (24.65, 34.2), (24.65, 35.8), (25.07774654, 35.8), (26.15, 35.3), (27.270332061, 36.9), (22.2, 36.9), align=None)
    extrude(amount=EXTRUDE12_DEPTH + EXTRUDE12_DEPTH_BACK, mode=Mode.SUBTRACT)


solid = part.part
